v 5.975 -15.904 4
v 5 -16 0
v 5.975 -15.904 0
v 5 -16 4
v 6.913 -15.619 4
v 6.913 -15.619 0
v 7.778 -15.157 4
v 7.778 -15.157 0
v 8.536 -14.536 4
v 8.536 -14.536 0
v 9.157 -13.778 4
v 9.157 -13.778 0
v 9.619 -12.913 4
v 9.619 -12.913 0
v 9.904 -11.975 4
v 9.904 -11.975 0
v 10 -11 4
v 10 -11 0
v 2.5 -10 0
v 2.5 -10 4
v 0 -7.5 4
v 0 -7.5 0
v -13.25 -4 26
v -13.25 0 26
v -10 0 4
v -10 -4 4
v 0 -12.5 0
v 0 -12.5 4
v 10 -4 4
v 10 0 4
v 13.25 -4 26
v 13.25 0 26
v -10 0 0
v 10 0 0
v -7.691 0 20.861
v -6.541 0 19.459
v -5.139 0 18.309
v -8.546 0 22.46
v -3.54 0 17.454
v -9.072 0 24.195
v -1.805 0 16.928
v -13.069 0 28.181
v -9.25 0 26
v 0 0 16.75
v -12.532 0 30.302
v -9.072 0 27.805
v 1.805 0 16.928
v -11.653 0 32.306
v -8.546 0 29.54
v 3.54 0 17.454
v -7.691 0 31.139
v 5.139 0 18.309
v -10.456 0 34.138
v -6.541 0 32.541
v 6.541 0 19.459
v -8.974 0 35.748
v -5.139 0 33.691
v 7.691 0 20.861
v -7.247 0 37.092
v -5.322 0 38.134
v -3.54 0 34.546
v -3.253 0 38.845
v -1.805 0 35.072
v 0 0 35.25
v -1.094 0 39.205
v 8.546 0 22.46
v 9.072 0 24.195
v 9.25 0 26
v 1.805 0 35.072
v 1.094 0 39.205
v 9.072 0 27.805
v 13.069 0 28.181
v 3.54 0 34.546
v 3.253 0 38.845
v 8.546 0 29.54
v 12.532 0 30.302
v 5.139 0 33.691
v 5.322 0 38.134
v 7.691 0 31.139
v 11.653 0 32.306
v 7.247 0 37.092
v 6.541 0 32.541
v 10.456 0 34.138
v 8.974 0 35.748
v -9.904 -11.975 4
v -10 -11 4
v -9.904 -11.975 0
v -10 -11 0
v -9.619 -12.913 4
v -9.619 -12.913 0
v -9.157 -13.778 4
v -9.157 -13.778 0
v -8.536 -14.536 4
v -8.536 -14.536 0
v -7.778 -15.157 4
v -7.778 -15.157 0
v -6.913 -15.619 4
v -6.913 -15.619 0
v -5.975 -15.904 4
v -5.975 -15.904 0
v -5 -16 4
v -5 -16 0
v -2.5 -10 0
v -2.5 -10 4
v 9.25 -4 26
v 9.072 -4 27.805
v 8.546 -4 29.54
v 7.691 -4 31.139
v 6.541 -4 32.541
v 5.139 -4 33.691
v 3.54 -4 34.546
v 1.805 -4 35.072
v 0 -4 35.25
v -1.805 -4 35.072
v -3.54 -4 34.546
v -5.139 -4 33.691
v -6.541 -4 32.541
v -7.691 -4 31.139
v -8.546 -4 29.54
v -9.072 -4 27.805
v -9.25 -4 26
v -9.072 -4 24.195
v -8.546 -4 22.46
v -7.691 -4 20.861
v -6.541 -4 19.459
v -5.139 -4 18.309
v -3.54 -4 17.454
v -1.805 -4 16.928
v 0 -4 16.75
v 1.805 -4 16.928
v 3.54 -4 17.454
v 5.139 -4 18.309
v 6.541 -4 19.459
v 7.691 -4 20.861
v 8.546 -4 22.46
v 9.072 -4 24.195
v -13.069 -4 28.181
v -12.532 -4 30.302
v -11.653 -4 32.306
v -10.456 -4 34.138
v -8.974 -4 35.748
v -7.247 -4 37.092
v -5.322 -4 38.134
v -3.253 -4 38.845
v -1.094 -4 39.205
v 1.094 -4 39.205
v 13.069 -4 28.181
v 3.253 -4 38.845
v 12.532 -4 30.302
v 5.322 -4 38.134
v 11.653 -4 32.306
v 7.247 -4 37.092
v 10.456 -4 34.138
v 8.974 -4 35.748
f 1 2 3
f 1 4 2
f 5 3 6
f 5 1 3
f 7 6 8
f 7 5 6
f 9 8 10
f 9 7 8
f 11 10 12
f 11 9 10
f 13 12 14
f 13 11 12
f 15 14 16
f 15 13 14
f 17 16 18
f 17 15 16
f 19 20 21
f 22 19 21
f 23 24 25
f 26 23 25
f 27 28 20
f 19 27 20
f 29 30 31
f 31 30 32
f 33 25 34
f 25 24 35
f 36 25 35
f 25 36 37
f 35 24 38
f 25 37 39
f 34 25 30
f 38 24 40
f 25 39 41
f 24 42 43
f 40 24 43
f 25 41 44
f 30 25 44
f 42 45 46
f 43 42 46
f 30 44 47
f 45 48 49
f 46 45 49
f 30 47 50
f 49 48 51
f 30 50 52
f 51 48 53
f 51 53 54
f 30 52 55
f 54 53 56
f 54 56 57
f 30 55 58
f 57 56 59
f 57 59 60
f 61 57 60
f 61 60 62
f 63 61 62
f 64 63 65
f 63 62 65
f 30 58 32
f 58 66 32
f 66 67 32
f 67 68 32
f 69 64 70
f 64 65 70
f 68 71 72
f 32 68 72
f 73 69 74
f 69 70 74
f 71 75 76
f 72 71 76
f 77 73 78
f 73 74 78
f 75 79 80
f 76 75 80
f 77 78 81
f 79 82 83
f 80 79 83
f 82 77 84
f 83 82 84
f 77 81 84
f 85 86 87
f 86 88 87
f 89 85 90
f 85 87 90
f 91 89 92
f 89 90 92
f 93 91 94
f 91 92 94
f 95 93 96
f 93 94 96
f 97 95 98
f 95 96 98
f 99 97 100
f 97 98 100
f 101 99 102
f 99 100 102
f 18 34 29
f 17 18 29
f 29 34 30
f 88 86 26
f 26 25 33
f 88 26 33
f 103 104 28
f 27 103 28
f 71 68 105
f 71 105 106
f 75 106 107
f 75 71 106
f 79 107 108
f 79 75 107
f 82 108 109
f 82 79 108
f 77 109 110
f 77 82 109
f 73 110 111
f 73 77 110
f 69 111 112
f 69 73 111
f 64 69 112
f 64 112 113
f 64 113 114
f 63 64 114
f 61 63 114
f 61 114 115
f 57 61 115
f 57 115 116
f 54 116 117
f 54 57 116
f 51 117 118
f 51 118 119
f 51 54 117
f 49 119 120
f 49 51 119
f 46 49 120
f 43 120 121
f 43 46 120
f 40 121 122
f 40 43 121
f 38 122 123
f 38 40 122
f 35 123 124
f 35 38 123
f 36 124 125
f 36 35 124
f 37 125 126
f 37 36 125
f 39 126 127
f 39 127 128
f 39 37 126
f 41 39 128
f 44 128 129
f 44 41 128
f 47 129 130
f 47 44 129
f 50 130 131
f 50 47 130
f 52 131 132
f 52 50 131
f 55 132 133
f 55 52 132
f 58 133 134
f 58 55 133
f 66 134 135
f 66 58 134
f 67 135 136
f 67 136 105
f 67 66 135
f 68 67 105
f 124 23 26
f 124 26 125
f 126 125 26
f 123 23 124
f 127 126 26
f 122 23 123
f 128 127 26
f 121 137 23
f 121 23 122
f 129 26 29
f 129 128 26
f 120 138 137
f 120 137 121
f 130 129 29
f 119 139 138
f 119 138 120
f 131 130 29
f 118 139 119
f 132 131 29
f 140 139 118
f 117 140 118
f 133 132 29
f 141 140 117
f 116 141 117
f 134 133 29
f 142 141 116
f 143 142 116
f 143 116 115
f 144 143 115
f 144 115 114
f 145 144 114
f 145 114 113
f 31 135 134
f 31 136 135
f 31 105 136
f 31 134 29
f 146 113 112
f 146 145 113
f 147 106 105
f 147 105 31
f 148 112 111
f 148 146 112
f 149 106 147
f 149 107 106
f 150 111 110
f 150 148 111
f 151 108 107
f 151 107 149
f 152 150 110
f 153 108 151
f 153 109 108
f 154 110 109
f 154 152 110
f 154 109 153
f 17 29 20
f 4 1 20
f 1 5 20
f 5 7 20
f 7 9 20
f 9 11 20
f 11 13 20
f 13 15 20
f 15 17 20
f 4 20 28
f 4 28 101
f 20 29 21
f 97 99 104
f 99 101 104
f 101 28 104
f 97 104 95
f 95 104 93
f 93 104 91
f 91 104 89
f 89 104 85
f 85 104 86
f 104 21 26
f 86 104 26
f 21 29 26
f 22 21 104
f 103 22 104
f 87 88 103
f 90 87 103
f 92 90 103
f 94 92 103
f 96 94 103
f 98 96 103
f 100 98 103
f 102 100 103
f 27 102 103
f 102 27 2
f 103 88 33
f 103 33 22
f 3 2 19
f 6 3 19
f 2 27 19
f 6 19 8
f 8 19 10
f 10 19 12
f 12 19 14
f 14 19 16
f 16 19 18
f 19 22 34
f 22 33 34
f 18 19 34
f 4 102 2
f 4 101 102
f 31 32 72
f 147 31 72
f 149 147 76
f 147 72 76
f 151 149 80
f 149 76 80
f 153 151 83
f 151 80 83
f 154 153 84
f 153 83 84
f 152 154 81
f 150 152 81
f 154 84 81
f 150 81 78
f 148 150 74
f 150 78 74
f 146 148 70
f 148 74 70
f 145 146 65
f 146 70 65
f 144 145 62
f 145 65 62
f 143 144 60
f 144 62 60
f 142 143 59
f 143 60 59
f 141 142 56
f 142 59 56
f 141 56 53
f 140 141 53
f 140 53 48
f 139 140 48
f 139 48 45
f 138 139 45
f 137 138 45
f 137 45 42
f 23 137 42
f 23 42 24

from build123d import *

# Parameters (mm, degrees)
F1_DEPTH = 16
F0_R     = 9.25
F2_DEPTH = 4
F4_R     = 5
F5_DEPTH = 4


with BuildPart() as f1:
    # F0 (on Front) → F1 (new body)
    with BuildSketch(Plane.XZ):
        Polygon((-10, 0), (0, 0), (10, 0), (10, 4), (0, 4), (-10, 4), align=None)
    extrude(amount=F1_DEPTH)

    # F0 (on Front) → F2 (join)
    with BuildSketch(Plane.XZ):
        with BuildLine():
            Line((-13.25, 26), (-10, 4))
            Line((-10, 4), (0, 4))
            Line((0, 4), (10, 4))
            Line((10, 4), (13.25, 26))
            ThreePointArc((13.25, 26), (0, 39.25), (-13.25, 26))
        make_face()
        with Locations((0, 26)):
            Circle(F0_R, mode=Mode.SUBTRACT)
    extrude(amount=F2_DEPTH)

    # F4
    f4_edges = [f1.edges().sort_by_distance(p)[0] for p in [
        (-10, -16, 2),
        (10, -16, 2),
    ]]
    fillet(f4_edges, radius=F4_R)

    # F3 (on face) → F5 (cut)
    with BuildSketch(Plane.XY.offset(4)):
        Polygon((-2.5, -10), (0, -10), (0, -7.5), align=None)
        Polygon((0, -12.5), (0, -10), (-2.5, -10), align=None)
        Polygon((2.5, -10), (0, -10), (0, -12.5), align=None)
        Polygon((0, -7.5), (0, -10), (2.5, -10), align=None)
    extrude(amount=-F5_DEPTH, mode=Mode.SUBTRACT)


solid = f1.part
